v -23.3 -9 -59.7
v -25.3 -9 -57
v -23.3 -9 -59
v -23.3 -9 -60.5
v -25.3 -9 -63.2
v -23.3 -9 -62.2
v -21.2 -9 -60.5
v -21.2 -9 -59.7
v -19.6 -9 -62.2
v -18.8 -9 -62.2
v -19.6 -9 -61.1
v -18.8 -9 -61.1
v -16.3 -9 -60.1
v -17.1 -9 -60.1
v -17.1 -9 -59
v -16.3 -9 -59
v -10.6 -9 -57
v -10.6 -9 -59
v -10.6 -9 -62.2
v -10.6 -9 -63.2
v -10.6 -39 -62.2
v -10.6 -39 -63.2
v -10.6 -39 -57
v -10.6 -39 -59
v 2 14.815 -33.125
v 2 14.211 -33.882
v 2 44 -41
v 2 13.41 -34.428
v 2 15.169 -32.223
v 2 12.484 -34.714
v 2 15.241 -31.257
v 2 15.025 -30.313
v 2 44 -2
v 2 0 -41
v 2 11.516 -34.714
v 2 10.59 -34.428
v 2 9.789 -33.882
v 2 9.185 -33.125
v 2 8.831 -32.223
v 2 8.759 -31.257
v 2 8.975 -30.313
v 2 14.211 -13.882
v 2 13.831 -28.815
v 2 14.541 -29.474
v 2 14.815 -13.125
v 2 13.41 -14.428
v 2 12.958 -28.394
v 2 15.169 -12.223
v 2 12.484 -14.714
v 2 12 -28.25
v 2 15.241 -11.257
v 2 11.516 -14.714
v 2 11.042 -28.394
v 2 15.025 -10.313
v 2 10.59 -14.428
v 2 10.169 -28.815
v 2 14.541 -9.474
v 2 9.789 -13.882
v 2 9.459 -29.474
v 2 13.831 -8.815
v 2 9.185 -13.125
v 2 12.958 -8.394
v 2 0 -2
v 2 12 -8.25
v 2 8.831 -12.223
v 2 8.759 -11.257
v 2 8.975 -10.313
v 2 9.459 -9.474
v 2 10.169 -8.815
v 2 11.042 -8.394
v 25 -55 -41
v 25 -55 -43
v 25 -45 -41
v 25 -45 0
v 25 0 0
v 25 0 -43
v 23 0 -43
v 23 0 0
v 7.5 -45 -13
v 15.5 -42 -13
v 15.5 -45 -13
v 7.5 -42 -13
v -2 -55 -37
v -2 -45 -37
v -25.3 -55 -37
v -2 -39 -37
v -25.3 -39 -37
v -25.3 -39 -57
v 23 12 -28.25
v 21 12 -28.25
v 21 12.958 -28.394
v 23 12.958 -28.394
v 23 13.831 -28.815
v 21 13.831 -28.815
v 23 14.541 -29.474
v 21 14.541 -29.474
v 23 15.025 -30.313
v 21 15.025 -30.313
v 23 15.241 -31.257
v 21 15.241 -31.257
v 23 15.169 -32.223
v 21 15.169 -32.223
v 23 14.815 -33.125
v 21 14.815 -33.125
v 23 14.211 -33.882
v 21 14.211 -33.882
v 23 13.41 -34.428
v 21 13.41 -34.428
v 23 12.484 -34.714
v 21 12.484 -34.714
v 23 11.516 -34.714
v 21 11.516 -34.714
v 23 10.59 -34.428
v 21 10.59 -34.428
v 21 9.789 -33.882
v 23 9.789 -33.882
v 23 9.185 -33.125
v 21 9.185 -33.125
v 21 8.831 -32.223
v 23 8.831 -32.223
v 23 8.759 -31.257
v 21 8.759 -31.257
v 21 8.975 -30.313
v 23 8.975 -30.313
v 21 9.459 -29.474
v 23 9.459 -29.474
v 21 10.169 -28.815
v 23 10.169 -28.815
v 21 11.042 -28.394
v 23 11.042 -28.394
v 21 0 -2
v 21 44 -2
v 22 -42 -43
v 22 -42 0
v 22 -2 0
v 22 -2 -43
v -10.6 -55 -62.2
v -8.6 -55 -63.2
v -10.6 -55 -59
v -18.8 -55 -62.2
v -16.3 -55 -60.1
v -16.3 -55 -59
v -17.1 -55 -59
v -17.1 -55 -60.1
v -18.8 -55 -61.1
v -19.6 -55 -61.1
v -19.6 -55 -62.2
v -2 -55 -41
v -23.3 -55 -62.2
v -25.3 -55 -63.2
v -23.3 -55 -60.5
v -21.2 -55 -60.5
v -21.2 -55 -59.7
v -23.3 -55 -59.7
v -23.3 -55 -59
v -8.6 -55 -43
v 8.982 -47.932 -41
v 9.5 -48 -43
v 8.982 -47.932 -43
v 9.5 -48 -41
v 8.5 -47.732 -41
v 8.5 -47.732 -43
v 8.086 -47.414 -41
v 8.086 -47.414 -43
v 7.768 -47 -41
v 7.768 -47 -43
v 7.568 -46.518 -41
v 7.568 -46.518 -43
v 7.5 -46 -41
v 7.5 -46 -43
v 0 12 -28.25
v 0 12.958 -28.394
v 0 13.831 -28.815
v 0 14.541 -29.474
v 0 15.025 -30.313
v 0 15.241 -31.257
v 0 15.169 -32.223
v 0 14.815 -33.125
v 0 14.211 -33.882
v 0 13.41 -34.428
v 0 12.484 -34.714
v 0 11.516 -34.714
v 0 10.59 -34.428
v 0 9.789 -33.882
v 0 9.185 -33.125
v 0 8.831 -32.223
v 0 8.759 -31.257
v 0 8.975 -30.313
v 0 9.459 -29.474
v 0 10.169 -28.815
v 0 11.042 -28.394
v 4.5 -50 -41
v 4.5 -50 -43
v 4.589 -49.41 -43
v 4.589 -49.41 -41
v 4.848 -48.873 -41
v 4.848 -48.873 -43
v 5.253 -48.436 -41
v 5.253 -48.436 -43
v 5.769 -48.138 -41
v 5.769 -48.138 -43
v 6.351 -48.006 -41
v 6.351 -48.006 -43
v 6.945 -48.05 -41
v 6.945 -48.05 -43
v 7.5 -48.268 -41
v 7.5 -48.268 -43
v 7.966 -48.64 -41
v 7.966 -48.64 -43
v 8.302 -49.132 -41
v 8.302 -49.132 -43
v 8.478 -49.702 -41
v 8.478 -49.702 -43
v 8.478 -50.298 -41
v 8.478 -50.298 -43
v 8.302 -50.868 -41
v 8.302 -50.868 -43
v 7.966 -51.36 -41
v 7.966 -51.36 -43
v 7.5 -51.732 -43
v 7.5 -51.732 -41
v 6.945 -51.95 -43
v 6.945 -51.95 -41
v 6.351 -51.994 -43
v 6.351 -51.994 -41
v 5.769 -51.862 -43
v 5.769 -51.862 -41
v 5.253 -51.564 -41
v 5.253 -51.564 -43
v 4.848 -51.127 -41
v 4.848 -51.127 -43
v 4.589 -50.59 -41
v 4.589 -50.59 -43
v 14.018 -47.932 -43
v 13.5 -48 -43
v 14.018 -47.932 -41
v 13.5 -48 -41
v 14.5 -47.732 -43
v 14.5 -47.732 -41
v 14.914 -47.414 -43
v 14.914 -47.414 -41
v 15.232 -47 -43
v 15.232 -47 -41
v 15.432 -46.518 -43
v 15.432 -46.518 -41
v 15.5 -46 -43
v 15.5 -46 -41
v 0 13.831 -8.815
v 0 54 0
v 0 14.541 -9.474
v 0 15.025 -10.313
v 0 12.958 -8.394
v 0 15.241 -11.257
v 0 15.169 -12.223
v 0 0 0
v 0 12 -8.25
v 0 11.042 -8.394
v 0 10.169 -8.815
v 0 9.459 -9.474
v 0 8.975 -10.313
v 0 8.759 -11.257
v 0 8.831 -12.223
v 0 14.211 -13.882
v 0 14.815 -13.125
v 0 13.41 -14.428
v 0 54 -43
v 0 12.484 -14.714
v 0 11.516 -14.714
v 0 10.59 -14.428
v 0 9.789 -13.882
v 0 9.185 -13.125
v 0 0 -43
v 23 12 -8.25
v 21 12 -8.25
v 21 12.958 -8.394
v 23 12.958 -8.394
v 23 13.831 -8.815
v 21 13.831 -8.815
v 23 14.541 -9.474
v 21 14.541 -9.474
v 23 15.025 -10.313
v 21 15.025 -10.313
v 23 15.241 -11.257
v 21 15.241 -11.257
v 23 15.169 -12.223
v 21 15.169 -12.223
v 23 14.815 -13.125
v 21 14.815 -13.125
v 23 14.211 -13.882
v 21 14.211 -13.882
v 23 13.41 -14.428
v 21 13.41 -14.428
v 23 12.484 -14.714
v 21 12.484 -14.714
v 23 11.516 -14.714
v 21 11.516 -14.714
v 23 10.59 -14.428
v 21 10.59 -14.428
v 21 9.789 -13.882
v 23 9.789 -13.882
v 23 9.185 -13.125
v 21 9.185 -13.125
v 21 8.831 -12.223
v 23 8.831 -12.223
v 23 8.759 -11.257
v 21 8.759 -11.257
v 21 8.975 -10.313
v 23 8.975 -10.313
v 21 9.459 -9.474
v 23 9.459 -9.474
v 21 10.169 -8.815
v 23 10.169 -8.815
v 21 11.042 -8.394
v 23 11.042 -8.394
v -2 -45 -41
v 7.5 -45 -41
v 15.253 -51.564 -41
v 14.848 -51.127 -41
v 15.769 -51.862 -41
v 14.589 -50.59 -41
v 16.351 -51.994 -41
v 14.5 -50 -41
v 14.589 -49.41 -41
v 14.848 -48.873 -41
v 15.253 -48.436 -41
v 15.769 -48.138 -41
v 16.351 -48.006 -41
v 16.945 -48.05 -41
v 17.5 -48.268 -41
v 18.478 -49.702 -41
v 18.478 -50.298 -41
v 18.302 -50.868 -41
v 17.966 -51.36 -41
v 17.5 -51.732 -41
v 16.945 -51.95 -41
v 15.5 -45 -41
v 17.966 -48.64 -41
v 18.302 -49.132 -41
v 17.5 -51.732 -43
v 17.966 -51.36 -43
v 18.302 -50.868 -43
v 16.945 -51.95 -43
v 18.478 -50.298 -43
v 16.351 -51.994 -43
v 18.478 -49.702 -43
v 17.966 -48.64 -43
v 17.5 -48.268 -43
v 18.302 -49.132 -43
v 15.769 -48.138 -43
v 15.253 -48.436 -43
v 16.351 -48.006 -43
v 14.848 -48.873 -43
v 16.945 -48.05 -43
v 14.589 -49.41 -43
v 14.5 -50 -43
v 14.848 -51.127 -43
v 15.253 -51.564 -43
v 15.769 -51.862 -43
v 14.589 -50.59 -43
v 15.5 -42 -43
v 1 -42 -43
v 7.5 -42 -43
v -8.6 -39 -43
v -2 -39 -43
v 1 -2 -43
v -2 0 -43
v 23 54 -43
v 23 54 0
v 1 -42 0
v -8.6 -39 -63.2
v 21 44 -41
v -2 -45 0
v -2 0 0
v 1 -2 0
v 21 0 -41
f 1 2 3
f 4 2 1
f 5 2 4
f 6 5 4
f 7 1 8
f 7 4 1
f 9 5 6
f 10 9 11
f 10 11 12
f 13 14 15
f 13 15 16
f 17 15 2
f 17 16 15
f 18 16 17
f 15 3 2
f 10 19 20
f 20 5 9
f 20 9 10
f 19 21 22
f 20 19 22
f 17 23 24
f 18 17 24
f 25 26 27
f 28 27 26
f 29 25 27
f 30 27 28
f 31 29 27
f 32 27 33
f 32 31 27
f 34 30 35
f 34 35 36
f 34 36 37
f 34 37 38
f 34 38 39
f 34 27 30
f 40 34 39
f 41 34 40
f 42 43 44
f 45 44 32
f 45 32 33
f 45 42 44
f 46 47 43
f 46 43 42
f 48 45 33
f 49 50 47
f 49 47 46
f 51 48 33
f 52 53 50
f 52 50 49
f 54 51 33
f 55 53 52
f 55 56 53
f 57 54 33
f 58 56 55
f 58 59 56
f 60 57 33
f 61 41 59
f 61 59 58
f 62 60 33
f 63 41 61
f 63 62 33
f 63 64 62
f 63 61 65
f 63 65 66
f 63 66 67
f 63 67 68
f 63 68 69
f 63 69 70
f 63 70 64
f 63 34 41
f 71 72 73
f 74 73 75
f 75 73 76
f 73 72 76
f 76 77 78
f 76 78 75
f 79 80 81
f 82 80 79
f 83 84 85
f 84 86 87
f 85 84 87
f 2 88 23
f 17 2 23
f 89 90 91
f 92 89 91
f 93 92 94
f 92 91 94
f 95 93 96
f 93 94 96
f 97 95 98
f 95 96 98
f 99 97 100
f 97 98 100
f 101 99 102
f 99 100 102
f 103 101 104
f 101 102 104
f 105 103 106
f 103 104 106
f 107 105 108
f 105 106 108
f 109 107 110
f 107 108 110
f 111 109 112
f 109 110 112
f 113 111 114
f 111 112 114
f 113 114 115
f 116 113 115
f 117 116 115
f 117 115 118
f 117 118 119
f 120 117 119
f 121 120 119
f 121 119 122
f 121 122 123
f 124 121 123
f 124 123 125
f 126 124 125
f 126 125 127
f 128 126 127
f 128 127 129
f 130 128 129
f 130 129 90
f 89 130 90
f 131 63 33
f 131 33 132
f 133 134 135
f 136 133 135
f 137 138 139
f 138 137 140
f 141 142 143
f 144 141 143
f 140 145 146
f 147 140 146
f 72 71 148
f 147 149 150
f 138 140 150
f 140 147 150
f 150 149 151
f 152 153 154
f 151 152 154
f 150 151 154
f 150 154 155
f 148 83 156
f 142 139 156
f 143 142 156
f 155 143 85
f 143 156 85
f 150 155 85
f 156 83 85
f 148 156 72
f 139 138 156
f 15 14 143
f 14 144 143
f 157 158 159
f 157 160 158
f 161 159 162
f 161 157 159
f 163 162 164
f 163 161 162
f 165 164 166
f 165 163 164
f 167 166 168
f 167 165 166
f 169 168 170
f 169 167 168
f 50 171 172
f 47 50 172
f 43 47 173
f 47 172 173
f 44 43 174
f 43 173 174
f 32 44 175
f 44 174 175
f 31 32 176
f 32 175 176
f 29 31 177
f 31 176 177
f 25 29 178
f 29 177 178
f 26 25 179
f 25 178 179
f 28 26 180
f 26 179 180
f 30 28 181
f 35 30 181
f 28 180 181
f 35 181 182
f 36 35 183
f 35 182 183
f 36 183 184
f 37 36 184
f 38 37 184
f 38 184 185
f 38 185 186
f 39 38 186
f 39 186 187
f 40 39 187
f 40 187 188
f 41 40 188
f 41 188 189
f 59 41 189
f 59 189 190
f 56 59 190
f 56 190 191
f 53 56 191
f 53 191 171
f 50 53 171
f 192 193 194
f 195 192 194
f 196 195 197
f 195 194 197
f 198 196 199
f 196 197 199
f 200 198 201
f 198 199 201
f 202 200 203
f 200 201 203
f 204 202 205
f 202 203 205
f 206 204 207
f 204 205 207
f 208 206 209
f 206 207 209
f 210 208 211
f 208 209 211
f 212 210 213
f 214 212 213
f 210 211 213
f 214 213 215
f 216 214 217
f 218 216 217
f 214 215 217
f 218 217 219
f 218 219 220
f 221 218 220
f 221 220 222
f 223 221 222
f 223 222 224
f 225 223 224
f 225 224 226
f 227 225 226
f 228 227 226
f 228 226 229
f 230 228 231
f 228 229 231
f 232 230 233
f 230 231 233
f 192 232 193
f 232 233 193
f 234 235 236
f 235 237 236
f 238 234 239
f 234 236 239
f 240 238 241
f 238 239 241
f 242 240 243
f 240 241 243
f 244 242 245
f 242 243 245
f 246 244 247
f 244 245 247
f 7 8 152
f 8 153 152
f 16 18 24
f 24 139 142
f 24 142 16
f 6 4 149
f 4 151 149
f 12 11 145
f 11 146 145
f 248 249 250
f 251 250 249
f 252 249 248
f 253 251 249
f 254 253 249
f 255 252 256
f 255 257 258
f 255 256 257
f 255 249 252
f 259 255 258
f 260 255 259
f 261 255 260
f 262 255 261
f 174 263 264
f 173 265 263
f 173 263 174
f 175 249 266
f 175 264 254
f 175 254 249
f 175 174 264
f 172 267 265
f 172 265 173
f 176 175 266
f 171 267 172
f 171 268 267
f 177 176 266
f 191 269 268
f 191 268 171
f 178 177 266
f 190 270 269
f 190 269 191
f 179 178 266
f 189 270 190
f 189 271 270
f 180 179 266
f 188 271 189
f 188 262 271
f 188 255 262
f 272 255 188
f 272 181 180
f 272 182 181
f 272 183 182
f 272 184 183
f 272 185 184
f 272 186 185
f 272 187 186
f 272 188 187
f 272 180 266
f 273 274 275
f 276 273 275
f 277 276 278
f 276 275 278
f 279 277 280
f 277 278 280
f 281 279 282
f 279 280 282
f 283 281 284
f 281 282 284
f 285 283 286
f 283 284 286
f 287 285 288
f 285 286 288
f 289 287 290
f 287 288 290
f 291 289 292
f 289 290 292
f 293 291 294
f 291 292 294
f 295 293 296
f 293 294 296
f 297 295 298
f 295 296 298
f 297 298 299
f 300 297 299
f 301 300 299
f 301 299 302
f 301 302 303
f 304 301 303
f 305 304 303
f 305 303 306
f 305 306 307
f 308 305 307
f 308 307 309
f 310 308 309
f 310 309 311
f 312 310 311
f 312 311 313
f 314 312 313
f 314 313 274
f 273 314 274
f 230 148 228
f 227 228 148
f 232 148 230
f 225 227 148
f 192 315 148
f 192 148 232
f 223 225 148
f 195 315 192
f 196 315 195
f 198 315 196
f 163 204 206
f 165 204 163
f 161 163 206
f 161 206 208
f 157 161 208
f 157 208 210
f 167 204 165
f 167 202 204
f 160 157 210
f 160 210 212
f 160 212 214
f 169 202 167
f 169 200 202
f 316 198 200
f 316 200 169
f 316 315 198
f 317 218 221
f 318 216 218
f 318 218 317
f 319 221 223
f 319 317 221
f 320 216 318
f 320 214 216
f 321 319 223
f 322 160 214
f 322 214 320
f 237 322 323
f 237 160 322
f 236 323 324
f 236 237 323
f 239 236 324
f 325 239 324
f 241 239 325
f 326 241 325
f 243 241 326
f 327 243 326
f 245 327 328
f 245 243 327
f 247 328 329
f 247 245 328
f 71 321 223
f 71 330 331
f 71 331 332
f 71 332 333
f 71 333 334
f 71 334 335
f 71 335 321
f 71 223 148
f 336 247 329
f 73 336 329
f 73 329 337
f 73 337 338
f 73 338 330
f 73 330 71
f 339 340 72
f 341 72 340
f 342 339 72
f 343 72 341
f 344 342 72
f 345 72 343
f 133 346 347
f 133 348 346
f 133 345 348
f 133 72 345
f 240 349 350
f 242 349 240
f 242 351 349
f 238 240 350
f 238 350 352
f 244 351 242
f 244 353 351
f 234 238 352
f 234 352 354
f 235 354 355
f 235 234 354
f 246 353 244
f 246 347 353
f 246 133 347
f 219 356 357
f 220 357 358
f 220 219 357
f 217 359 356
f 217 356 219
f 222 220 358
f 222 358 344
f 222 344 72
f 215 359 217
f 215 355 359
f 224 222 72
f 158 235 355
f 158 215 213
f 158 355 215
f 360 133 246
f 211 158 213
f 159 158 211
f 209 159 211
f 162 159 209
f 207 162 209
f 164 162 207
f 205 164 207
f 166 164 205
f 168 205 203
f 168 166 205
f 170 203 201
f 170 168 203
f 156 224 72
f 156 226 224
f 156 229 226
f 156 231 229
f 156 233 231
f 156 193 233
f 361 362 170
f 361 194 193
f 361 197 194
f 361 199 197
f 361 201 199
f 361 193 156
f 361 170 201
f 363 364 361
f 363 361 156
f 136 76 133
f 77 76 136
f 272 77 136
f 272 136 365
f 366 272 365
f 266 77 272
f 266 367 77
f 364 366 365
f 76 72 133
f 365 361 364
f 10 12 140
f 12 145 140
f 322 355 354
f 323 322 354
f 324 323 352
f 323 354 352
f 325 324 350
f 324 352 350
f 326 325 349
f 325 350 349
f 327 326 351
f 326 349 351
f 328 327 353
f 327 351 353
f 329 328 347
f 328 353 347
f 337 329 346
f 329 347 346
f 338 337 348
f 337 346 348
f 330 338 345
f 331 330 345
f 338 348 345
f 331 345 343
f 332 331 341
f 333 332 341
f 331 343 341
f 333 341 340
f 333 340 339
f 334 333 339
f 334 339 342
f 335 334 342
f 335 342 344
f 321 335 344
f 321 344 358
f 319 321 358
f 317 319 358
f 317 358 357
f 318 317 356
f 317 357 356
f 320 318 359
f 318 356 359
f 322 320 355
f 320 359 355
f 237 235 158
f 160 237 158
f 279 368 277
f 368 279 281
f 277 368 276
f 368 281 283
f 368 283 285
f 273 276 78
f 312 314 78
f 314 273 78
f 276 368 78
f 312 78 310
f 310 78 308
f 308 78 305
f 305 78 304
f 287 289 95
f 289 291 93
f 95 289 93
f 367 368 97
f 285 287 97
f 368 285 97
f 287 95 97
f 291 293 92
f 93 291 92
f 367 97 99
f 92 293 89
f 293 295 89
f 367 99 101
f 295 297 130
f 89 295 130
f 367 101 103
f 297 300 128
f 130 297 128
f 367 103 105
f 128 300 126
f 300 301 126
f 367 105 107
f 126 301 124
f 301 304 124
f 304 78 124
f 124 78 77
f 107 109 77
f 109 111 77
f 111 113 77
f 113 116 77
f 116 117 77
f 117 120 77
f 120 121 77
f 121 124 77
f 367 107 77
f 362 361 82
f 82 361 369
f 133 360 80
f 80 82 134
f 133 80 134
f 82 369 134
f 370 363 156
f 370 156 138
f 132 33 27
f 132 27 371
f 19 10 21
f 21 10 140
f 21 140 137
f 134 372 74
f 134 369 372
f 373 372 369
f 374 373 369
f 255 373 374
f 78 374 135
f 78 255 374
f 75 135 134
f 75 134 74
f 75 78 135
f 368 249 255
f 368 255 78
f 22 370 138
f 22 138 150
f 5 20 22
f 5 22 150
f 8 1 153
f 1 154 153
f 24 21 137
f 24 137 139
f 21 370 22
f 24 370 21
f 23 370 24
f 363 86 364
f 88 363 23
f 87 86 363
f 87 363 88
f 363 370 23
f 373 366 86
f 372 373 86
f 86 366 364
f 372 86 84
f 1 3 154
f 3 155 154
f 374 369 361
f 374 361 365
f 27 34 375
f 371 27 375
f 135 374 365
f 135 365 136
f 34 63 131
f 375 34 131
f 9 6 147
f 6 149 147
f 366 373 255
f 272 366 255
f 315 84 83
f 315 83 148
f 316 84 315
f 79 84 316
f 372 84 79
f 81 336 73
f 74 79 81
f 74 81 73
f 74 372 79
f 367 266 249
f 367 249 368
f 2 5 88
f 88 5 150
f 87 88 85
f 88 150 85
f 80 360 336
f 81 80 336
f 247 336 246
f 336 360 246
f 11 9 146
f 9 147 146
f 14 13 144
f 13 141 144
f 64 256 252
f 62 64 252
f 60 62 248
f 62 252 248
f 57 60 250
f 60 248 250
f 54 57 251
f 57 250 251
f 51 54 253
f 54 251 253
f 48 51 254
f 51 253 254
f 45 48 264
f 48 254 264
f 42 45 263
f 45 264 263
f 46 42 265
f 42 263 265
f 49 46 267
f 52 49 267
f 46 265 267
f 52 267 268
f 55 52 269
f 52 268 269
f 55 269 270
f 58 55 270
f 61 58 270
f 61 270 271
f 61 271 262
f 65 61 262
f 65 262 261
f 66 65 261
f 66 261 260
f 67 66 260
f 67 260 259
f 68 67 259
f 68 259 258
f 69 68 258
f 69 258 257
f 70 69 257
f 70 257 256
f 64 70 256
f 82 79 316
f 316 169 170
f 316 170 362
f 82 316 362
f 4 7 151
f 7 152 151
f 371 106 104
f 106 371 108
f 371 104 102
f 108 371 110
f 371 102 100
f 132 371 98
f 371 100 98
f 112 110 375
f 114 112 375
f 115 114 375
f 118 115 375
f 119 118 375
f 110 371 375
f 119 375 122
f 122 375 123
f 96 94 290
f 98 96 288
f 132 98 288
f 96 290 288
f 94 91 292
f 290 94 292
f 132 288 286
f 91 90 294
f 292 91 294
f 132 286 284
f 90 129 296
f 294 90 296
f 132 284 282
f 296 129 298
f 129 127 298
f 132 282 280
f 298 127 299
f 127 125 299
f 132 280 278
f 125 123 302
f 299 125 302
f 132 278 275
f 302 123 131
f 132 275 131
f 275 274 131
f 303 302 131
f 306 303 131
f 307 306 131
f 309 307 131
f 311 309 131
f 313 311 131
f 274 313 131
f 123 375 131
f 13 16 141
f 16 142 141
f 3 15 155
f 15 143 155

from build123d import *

# Parameters (mm, degrees)
SKETCH_1_W           = 23
SKETCH_1_H           = 43
EXTRUDE_1_DEPTH      = 54
SKETCH_2_OUTSIDE_W   = 39.552
SKETCH_2_OUTSIDE_H   = 59.552
SKETCH_2_OUTSIDE_W_2 = 23
SKETCH_2_OUTSIDE_H_2 = 43
SKETCH_2_OUTSIDE_W_3 = 19
SKETCH_2_OUTSIDE_H_3 = 39
CUT_EXTRUDE_1_DEPTH  = 44
SKETCH_3_W           = 27
SKETCH_3_H           = 45
SKETCH_3_W_2         = 21
SKETCH_3_H_2         = 40
EXTRUDE_2_DEPTH      = 43
SKETCH_4_R           = 3.25
CUT_EXTRUDE_2_DEPTH  = 74.416619372
SKETCH_5_W           = 8
SKETCH_5_H           = 3
CUT_EXTRUDE_3_DEPTH  = 30
SKETCH_6_R           = 2
EXTRUDE_3_DEPTH      = 2
EXTRUDE_4_DEPTH      = 10
EXTRUDE_4_DEPTH_BACK = 6
FILLET_1_R           = 2
EXTRUDE_5_DEPTH      = 30


with BuildPart() as part:
    # 草图1 → 凸台-拉伸1 (new body)
    with BuildSketch(Plane(origin=(0, 0, 0), x_dir=(1, 0, 0), z_dir=(0, 1, 0))):
        with Locations((11.5, 21.5)):
            Rectangle(SKETCH_1_W, SKETCH_1_H)
    extrude(amount=EXTRUDE_1_DEPTH)

    # 草图2 outside → 切除-拉伸1 (cut)
    # profile 1 of 2: a face of its own
    with BuildSketch(Plane.XZ):
        with Locations((11.5, -21.5)):
            Rectangle(SKETCH_2_OUTSIDE_W, SKETCH_2_OUTSIDE_H)
        with Locations((11.5, -21.5)):
            Rectangle(SKETCH_2_OUTSIDE_W_2, SKETCH_2_OUTSIDE_H_2, mode=Mode.SUBTRACT)
    # profile 2 of 2: a face of its own
    with BuildSketch(Plane.XZ):
        with Locations((11.5, -21.5)):
            Rectangle(SKETCH_2_OUTSIDE_W_3, SKETCH_2_OUTSIDE_H_3)
    extrude(amount=-CUT_EXTRUDE_1_DEPTH, mode=Mode.SUBTRACT)

    # 草图3 → 凸台-拉伸2 (add)
    with BuildSketch(Plane.XY):
        with Locations((11.5, -22.5)):
            Rectangle(SKETCH_3_W, SKETCH_3_H)
        with Locations((11.5, -22)):
            Rectangle(SKETCH_3_W_2, SKETCH_3_H_2, mode=Mode.SUBTRACT)
    extrude(amount=-EXTRUDE_2_DEPTH)

    # 草图4 → 切除-拉伸2 (cut, through all)
    with BuildSketch(Plane.ZY):
        with Locations((-31.5, 12)):
            Circle(SKETCH_4_R)
        with Locations((-11.5, 12)):
            Circle(SKETCH_4_R)
    extrude(amount=-CUT_EXTRUDE_2_DEPTH, mode=Mode.SUBTRACT)

    # 草图5 → 切除-拉伸3 (cut)
    with BuildSketch(Plane(origin=(0, 0, -43), x_dir=(-1, 0, 0), z_dir=(0, 0, -1))):
        with Locations((-11.5, -43.5)):
            Rectangle(SKETCH_5_W, SKETCH_5_H)
    extrude(amount=-CUT_EXTRUDE_3_DEPTH, mode=Mode.SUBTRACT)

    # 草图6 → 凸台-拉伸3 (add)
    with BuildSketch(Plane(origin=(0, 0, -43), x_dir=(-1, 0, 0), z_dir=(0, 0, -1))):
        Polygon((-25, -45), (-15.5, -45), (-15.5, -48), (-7.5, -48), (-7.5, -45), (2, -45), (2, -55), (-7.5, -55), (-15.5, -55), (-25, -55), align=None)
        with Locations((-16.5, -50)):
            Circle(SKETCH_6_R, mode=Mode.SUBTRACT)
        with Locations((-6.5, -50)):
            Circle(SKETCH_6_R, mode=Mode.SUBTRACT)
    extrude(amount=-EXTRUDE_3_DEPTH)

    # 草图8 → 凸台-拉伸4 (add, two sides: drawn at the far end of the back side and taken through both)
    with BuildSketch(Plane.XZ.offset(45).offset(-EXTRUDE_4_DEPTH_BACK)):
        Polygon((-8.6, -63.2), (-25.3, -63.2), (-25.3, -37), (-8.6, -37), (-2, -37), (-2, -43), (-8.6, -43), align=None)
        Polygon((-17.1, -59), (-23.3, -59), (-23.3, -59.7), (-21.2, -59.7), (-21.2, -60.5), (-23.3, -60.5), (-23.3, -62.2), (-19.6, -62.2), (-19.6, -61.1), (-18.8, -61.1), (-18.8, -62.2), (-10.6, -62.2), (-10.6, -59), (-16.3, -59), (-16.3, -60.1), (-17.1, -60.1), align=None, mode=Mode.SUBTRACT)
    extrude(amount=EXTRUDE_4_DEPTH + EXTRUDE_4_DEPTH_BACK)

    # 圆角1
    fillet_1_edges = [part.edges().sort_by_distance(p)[0] for p in [
        (15.5, -48, -42),
        (7.5, -48, -42),
    ]]
    fillet(fillet_1_edges, radius=FILLET_1_R)

    # 草图9 → 凸台-拉伸5 (add)
    with BuildSketch(Plane(origin=(0, -39, 0), x_dir=(1, 0, 0), z_dir=(0, 1, 0))):
        Polygon((-10.6, 57), (-10.6, 59), (-16.3, 59), (-16.3, 60.1), (-17.1, 60.1), (-17.1, 59), (-23.3, 59), (-23.3, 59.7), (-21.2, 59.7), (-21.2, 60.5), (-23.3, 60.5), (-23.3, 62.2), (-19.6, 62.2), (-19.6, 61.1), (-18.8, 61.1), (-18.8, 62.2), (-10.6, 62.2), (-10.6, 63.2), (-25.3, 63.2), (-25.3, 57), align=None)
    extrude(amount=EXTRUDE_5_DEPTH)


solid = part.part
